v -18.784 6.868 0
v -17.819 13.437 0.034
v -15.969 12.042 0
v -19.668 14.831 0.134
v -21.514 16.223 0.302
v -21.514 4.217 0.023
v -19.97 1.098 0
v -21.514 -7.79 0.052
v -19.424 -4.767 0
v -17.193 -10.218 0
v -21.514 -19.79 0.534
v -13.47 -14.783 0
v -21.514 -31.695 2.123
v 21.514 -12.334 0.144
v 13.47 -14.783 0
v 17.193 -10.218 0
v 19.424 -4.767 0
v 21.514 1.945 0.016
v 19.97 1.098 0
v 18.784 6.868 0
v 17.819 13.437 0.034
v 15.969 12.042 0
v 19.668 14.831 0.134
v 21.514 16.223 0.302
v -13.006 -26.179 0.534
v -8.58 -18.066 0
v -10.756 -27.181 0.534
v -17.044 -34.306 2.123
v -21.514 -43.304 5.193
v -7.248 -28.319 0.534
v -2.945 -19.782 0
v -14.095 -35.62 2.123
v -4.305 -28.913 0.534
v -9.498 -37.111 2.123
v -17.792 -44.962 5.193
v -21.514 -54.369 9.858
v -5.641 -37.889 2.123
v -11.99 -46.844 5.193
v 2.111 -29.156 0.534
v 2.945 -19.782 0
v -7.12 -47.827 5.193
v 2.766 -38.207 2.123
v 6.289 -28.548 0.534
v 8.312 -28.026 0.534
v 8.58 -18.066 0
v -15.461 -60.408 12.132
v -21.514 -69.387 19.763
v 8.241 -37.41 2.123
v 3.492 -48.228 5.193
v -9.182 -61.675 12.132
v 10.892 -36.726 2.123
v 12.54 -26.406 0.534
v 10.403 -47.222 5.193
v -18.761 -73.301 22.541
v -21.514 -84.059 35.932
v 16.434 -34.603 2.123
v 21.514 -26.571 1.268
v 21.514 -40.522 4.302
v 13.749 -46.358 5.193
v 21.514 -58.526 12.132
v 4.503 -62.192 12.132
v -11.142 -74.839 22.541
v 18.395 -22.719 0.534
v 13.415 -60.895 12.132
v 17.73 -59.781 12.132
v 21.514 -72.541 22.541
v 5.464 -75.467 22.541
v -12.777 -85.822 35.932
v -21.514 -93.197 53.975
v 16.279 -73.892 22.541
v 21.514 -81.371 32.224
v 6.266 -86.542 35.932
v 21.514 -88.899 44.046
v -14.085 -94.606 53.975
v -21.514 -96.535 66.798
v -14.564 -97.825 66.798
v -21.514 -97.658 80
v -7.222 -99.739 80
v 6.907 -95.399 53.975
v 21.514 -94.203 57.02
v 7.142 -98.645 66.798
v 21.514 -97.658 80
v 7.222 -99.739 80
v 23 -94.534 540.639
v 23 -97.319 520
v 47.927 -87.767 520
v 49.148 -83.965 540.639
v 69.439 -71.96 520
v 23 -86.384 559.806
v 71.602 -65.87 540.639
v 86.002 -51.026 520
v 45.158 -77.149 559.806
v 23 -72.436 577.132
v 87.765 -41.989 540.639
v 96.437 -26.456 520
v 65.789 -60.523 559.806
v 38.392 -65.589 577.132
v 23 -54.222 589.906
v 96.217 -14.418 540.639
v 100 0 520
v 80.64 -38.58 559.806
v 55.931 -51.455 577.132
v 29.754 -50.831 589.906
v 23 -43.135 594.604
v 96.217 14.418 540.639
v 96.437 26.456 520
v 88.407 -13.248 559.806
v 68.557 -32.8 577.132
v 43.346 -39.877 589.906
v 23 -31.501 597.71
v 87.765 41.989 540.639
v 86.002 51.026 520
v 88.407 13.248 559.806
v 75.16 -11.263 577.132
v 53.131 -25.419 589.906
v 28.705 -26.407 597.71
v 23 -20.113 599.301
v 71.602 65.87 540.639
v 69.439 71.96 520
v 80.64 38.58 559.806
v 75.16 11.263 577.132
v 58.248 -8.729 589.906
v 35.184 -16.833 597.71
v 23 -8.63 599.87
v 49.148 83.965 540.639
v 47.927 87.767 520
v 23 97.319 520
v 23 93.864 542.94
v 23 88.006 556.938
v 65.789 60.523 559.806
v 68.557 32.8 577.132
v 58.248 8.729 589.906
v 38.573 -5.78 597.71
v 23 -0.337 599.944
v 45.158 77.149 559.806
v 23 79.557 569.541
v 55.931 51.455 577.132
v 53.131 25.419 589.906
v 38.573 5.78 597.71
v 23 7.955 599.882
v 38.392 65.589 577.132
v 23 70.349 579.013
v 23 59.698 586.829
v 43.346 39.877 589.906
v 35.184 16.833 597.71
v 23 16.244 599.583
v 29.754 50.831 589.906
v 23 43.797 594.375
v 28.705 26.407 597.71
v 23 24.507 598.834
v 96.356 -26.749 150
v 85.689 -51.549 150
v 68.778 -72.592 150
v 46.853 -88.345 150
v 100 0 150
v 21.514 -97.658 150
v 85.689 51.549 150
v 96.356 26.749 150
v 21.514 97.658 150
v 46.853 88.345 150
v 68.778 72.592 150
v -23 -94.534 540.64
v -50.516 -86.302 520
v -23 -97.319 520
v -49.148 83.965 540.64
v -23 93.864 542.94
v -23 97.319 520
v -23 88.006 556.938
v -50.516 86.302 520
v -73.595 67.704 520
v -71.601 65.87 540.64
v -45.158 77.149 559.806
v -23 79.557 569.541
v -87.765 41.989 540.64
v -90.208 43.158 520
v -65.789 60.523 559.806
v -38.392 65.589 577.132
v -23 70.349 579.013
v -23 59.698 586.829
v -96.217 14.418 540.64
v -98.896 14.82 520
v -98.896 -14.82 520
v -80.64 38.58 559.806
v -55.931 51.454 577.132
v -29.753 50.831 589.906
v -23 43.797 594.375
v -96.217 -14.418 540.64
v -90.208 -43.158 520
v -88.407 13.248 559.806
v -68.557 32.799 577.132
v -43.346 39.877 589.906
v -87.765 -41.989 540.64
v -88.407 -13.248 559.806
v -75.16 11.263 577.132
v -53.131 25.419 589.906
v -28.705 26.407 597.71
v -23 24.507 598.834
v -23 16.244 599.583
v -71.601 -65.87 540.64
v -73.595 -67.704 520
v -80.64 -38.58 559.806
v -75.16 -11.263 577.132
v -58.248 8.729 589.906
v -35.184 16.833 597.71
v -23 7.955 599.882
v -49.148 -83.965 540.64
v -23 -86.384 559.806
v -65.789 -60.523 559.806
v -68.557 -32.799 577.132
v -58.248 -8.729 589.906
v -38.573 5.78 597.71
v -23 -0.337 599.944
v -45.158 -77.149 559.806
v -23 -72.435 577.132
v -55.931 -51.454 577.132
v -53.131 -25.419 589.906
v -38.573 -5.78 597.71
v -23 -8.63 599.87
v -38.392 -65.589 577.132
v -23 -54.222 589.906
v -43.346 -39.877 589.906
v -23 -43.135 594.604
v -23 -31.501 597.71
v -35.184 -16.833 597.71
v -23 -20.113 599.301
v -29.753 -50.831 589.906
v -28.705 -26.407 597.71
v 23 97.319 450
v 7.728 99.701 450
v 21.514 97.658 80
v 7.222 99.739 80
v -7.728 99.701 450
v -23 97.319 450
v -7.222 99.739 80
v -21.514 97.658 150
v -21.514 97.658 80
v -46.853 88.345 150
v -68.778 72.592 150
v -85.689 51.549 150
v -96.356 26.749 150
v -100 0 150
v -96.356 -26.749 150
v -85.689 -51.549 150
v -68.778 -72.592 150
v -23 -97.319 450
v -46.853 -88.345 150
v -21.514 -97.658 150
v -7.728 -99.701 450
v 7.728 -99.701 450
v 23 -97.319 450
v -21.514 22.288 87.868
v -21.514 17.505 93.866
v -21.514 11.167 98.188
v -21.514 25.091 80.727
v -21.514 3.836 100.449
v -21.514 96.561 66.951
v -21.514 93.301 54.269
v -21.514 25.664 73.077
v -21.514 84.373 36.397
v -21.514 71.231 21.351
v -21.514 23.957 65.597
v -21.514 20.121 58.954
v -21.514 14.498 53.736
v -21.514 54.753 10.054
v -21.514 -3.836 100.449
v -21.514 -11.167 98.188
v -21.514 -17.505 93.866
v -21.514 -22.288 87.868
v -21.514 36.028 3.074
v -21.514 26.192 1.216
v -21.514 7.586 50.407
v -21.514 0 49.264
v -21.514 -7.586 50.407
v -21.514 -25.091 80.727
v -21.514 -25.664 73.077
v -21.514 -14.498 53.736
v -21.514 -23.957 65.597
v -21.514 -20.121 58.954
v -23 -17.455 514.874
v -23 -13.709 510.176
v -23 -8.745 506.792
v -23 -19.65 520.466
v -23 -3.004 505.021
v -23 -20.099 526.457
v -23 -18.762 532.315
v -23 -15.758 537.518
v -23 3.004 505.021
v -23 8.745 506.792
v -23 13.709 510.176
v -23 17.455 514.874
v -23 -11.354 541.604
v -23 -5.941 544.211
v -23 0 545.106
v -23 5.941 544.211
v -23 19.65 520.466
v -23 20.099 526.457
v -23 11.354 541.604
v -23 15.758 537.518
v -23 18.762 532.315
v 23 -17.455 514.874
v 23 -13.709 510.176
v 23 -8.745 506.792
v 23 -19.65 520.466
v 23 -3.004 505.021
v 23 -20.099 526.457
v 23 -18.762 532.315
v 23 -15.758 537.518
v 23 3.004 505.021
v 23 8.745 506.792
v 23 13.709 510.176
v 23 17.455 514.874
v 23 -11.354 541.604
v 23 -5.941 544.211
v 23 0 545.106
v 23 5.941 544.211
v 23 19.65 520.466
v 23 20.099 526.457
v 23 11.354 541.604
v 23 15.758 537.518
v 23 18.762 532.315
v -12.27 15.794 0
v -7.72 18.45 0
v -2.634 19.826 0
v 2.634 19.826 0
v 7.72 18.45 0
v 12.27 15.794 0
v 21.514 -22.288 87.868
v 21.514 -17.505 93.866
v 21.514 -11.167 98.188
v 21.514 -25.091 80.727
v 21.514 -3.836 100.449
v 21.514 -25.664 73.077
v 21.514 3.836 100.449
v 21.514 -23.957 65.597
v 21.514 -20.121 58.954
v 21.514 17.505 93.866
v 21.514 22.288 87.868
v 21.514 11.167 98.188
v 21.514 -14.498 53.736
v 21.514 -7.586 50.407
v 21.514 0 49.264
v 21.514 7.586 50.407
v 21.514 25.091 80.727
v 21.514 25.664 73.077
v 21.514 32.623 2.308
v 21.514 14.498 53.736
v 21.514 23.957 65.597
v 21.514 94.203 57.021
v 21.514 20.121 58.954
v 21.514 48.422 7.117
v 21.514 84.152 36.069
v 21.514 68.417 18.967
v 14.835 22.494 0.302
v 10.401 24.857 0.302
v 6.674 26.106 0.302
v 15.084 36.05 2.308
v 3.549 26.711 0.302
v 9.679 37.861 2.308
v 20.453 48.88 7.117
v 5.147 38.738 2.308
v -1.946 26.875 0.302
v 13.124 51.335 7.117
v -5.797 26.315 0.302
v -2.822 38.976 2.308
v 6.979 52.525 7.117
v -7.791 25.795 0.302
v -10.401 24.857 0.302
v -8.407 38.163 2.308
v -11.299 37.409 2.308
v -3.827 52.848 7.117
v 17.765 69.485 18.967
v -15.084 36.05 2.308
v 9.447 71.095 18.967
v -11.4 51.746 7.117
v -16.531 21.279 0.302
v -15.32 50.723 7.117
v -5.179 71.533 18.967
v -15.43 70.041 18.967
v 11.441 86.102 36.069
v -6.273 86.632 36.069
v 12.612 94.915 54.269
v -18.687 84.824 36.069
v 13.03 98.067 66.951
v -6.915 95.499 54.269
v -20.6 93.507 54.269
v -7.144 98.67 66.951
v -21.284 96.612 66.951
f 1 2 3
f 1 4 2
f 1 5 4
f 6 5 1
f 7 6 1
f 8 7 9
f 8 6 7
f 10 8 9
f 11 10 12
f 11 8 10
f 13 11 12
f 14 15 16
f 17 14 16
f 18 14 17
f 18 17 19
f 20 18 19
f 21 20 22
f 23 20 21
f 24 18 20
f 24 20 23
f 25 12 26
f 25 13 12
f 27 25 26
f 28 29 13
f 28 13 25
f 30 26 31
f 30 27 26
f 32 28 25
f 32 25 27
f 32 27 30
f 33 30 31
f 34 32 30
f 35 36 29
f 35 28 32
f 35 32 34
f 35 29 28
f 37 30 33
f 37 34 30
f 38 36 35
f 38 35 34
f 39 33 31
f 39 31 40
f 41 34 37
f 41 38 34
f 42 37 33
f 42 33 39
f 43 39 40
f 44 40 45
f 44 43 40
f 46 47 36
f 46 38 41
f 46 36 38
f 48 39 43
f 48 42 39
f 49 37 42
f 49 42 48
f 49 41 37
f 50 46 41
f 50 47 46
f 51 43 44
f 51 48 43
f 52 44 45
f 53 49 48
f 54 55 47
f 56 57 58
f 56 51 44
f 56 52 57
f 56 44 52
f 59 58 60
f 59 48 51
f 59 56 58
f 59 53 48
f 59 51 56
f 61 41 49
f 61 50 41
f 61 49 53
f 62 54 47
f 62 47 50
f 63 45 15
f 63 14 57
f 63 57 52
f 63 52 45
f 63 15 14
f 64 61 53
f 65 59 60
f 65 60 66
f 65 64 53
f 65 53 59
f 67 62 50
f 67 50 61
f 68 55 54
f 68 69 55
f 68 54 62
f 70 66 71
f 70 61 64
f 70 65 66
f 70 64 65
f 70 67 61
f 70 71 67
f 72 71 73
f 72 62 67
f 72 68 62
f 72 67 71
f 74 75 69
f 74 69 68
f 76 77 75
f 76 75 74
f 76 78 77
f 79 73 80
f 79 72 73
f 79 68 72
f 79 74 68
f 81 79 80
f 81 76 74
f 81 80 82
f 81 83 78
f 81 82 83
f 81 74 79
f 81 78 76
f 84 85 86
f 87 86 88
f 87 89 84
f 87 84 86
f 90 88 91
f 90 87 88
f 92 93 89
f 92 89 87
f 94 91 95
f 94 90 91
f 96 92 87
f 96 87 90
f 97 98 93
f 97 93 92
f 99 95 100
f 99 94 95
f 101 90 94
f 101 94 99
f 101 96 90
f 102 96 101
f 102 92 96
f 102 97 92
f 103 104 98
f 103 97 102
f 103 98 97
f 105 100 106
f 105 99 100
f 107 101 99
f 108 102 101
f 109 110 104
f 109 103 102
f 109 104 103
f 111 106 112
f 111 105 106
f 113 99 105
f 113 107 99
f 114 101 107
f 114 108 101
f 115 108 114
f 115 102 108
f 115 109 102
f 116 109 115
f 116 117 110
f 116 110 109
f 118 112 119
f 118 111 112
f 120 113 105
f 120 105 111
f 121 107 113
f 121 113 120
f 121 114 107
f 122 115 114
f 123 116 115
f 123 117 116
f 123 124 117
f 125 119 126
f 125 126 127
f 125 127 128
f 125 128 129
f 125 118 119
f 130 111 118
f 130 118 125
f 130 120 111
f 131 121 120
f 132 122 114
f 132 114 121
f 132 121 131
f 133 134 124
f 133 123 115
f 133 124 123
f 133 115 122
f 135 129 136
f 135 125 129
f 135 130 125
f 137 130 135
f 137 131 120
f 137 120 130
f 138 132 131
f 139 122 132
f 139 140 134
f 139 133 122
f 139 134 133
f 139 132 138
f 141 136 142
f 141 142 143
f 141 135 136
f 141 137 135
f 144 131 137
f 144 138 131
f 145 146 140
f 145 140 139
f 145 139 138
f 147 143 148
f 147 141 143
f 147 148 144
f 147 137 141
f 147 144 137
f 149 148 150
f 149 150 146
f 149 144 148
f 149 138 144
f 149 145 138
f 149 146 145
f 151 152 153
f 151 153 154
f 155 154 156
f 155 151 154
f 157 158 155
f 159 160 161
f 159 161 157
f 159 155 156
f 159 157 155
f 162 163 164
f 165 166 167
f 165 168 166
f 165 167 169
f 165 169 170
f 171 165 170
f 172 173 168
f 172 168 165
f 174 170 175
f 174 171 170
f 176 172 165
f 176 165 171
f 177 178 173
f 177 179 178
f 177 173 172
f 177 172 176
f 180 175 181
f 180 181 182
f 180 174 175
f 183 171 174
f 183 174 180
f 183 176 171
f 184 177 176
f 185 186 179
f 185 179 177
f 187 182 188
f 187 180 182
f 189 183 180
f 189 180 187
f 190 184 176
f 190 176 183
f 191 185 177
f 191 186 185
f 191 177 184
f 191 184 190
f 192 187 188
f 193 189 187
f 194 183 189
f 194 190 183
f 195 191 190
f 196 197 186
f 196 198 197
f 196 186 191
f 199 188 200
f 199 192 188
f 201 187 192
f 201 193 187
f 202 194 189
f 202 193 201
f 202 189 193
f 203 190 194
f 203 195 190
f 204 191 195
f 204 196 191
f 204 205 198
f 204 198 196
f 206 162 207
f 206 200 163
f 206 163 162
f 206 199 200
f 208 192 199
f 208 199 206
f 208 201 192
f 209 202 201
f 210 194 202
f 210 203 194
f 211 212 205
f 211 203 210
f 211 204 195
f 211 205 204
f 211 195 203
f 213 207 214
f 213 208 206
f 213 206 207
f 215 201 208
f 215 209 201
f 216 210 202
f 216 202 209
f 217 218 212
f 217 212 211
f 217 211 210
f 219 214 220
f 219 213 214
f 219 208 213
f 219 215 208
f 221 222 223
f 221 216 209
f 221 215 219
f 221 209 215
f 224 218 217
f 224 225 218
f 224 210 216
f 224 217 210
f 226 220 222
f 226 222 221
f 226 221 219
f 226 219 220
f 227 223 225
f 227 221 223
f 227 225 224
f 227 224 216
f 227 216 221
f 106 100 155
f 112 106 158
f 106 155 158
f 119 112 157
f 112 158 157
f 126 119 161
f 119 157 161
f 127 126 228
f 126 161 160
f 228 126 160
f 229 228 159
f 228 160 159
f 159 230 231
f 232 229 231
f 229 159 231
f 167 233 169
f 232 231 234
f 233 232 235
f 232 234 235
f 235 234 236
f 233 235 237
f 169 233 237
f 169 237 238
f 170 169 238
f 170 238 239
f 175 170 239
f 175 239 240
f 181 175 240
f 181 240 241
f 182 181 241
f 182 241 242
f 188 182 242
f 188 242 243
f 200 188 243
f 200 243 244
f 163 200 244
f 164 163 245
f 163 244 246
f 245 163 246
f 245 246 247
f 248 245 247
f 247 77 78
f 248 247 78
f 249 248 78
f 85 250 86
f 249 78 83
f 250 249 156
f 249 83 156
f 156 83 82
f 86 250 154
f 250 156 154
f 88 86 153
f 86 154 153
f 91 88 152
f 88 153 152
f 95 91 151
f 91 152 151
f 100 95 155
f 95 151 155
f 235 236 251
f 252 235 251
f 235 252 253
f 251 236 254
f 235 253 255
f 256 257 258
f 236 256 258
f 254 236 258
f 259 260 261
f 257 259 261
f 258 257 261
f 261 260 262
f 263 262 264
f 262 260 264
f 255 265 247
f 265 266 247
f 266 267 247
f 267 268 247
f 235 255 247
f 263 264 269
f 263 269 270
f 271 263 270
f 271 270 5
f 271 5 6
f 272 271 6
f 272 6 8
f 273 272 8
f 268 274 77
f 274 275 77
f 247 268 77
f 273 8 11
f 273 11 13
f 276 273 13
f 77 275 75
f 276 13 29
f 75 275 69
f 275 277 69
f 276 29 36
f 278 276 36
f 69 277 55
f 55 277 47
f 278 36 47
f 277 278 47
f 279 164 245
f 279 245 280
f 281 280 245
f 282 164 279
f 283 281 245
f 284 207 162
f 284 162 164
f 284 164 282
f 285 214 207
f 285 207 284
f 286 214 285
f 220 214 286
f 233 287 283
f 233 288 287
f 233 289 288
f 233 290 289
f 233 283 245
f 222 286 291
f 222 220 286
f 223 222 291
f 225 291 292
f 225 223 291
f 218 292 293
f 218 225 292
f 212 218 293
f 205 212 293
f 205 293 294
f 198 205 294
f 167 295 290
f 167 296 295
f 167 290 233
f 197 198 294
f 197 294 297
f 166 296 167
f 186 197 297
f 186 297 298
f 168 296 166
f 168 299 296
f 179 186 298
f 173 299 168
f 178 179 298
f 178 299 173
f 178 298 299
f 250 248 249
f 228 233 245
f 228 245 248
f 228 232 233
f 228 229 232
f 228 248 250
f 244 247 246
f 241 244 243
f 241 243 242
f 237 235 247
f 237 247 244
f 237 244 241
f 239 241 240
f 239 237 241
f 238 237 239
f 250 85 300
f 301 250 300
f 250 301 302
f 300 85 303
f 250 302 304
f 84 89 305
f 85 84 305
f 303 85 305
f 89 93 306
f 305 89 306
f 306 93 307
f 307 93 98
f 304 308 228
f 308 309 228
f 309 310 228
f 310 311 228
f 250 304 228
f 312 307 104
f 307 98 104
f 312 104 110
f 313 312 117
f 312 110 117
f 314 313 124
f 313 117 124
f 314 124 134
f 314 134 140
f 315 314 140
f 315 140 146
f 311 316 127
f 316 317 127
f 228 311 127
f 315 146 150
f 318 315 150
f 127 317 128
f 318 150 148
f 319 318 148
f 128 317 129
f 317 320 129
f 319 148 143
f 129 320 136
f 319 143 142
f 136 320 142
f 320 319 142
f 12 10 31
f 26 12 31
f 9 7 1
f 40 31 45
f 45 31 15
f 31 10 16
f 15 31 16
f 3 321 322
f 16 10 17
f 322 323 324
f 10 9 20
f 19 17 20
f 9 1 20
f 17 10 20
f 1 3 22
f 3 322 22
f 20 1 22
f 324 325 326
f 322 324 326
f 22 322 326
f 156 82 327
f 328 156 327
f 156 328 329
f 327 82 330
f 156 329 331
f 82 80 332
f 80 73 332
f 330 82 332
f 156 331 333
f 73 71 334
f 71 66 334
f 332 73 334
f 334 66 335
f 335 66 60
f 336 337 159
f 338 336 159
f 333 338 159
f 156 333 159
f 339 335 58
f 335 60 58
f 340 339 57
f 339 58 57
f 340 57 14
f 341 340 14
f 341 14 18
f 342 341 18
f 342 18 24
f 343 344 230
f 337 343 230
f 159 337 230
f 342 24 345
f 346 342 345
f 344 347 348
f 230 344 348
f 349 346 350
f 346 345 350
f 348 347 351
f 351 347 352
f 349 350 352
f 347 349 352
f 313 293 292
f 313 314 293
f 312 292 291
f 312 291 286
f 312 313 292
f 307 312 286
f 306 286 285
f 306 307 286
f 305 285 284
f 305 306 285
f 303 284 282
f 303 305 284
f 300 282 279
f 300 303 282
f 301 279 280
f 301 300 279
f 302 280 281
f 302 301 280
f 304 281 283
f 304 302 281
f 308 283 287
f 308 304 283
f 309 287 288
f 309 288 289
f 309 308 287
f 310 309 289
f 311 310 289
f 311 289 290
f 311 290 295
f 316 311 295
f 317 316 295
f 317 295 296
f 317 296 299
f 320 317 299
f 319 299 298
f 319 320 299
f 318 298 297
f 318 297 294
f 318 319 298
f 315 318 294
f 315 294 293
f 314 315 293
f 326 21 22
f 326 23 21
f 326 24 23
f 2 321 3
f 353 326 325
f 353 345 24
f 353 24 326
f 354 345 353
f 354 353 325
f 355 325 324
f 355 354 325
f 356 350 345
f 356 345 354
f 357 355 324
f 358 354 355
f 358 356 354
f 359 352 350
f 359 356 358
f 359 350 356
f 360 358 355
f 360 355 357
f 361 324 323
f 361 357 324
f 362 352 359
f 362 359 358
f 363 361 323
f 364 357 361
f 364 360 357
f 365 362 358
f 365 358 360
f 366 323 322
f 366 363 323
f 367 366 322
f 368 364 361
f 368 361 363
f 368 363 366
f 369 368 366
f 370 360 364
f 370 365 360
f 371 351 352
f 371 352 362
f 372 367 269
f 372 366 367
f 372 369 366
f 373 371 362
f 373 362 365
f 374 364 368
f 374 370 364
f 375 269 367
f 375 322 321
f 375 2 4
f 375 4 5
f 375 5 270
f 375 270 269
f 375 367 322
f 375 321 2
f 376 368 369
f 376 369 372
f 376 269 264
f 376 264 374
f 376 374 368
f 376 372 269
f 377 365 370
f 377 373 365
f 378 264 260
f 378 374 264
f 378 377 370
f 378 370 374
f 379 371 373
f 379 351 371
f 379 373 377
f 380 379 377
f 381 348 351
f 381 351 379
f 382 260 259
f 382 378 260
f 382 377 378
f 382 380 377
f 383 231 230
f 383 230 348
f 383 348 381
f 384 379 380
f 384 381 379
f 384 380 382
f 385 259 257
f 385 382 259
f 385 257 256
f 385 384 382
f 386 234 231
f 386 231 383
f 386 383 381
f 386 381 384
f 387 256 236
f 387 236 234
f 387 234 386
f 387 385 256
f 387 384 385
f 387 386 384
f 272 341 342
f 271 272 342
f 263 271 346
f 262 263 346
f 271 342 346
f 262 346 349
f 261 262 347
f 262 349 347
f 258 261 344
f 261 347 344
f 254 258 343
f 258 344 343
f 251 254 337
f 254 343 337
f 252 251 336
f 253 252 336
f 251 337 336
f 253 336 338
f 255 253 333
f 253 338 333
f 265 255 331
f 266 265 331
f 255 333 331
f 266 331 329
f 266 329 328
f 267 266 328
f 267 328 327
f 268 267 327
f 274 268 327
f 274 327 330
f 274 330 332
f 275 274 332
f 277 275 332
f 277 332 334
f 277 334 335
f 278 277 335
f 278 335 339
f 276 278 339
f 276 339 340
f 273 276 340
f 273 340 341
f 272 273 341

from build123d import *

# Parameters (mm, degrees)
SKETCH1_R           = 100
BOSS_EXTRUDE1_DEPTH = 600
FILLET2_R           = 80
SKETCH2_W           = 46
SKETCH2_H           = 231.861905776
CUT_EXTRUDE1_DEPTH  = 150
SKETCH3_R           = 20.155129503
BOSS_EXTRUDE2_DEPTH = 30
CUT_EXTRUDE2_DEPTH  = 150
FILLET3_R           = 80
SKETCH5_R           = 25.736273229
CUT_EXTRUDE3_DEPTH  = 520


with BuildPart() as part:
    # Sketch1 → Boss-Extrude1 (new body)
    with BuildSketch(Plane.XY):
        Circle(SKETCH1_R)
    extrude(amount=BOSS_EXTRUDE1_DEPTH)

    # Fillet2
    fillet2_edges = [part.edges().sort_by_distance(p)[0] for p in [
        (-100, 0, 600),
    ]]
    fillet(fillet2_edges, radius=FILLET2_R)

    # Sketch2 → Cut-Extrude1 (cut)
    with BuildSketch(Plane.XY.offset(600)):
        Rectangle(SKETCH2_W, SKETCH2_H)
    extrude(amount=-CUT_EXTRUDE1_DEPTH, mode=Mode.SUBTRACT)

    # Sketch3 → Boss-Extrude2 (add, symmetric)
    with BuildSketch(Plane(origin=(0, 0, 0), x_dir=(0, 0, -1), z_dir=(1, 0, 0))):
        with Locations(Location((-524.951093161, 0, 0), (0, 0, 180))):
            Circle(SKETCH3_R)
    extrude(amount=BOSS_EXTRUDE2_DEPTH, both=True)

    # Sketch4 → Cut-Extrude2 (cut)
    with BuildSketch(Plane(origin=(0, 0, 0), x_dir=(-1, 0, 0), z_dir=(0, 0, -1))):
        with BuildLine():
            ThreePointArc((-21.514315111, 97.658252315), (-100, 0), (-21.514315111, -97.658252315))
            Line((-21.514315111, -97.658252315), (-21.514315111, 97.658252315))
        make_face()
        with BuildLine():
            Line((21.514315111, 97.658252315), (21.514315111, -97.658252315))
            ThreePointArc((21.514315111, -97.658252315), (100, 0), (21.514315111, 97.658252315))
        make_face()
    extrude(amount=-CUT_EXTRUDE2_DEPTH, mode=Mode.SUBTRACT)

    # Fillet3
    # the kernel refuses this fillet: 80 mm, written as the material it takes off along each edge
    with BuildSketch(Plane(origin=(0, 0, 0), x_dir=(-0.7984359735160296, 0.6020797257801578, 0), z_dir=(0.6020797257801578, 0.7984359735160296, 0))) as fillet3_piece_1:
        with BuildLine():
            CenterArc((100 - FILLET3_R, FILLET3_R), FILLET3_R, 270, 90)
            Line((100 - FILLET3_R, 0), (100, 0))
            Line((100, 0), (100, FILLET3_R))
        make_face()
    revolve(axis=Axis((0, 0, 0), (0, 0, 1)), revolution_arc=254.037985384, mode=Mode.SUBTRACT)
    with BuildSketch(Plane(origin=(0, 0, 0), x_dir=(0.79843597351603, -0.6020797257801573, 0), z_dir=(-0.6020797257801573, -0.79843597351603, 0))) as fillet3_piece_2:
        with BuildLine():
            CenterArc((100 - FILLET3_R, FILLET3_R), FILLET3_R, 270, 90)
            Line((100 - FILLET3_R, 0), (100, 0))
            Line((100, 0), (100, FILLET3_R))
        make_face()
    revolve(axis=Axis((0, 0, 0), (0, 0, 1)), revolution_arc=254.037985384, mode=Mode.SUBTRACT)

    # Sketch5 → Cut-Extrude3 (cut)
    with BuildSketch(Plane(origin=(21.514315111, 0, 0), x_dir=(0, 0, -1), z_dir=(1, 0, 0))):
        with Locations((-75, 0)):
            Circle(SKETCH5_R)
    extrude(amount=-CUT_EXTRUDE3_DEPTH, mode=Mode.SUBTRACT)


solid = part.part
